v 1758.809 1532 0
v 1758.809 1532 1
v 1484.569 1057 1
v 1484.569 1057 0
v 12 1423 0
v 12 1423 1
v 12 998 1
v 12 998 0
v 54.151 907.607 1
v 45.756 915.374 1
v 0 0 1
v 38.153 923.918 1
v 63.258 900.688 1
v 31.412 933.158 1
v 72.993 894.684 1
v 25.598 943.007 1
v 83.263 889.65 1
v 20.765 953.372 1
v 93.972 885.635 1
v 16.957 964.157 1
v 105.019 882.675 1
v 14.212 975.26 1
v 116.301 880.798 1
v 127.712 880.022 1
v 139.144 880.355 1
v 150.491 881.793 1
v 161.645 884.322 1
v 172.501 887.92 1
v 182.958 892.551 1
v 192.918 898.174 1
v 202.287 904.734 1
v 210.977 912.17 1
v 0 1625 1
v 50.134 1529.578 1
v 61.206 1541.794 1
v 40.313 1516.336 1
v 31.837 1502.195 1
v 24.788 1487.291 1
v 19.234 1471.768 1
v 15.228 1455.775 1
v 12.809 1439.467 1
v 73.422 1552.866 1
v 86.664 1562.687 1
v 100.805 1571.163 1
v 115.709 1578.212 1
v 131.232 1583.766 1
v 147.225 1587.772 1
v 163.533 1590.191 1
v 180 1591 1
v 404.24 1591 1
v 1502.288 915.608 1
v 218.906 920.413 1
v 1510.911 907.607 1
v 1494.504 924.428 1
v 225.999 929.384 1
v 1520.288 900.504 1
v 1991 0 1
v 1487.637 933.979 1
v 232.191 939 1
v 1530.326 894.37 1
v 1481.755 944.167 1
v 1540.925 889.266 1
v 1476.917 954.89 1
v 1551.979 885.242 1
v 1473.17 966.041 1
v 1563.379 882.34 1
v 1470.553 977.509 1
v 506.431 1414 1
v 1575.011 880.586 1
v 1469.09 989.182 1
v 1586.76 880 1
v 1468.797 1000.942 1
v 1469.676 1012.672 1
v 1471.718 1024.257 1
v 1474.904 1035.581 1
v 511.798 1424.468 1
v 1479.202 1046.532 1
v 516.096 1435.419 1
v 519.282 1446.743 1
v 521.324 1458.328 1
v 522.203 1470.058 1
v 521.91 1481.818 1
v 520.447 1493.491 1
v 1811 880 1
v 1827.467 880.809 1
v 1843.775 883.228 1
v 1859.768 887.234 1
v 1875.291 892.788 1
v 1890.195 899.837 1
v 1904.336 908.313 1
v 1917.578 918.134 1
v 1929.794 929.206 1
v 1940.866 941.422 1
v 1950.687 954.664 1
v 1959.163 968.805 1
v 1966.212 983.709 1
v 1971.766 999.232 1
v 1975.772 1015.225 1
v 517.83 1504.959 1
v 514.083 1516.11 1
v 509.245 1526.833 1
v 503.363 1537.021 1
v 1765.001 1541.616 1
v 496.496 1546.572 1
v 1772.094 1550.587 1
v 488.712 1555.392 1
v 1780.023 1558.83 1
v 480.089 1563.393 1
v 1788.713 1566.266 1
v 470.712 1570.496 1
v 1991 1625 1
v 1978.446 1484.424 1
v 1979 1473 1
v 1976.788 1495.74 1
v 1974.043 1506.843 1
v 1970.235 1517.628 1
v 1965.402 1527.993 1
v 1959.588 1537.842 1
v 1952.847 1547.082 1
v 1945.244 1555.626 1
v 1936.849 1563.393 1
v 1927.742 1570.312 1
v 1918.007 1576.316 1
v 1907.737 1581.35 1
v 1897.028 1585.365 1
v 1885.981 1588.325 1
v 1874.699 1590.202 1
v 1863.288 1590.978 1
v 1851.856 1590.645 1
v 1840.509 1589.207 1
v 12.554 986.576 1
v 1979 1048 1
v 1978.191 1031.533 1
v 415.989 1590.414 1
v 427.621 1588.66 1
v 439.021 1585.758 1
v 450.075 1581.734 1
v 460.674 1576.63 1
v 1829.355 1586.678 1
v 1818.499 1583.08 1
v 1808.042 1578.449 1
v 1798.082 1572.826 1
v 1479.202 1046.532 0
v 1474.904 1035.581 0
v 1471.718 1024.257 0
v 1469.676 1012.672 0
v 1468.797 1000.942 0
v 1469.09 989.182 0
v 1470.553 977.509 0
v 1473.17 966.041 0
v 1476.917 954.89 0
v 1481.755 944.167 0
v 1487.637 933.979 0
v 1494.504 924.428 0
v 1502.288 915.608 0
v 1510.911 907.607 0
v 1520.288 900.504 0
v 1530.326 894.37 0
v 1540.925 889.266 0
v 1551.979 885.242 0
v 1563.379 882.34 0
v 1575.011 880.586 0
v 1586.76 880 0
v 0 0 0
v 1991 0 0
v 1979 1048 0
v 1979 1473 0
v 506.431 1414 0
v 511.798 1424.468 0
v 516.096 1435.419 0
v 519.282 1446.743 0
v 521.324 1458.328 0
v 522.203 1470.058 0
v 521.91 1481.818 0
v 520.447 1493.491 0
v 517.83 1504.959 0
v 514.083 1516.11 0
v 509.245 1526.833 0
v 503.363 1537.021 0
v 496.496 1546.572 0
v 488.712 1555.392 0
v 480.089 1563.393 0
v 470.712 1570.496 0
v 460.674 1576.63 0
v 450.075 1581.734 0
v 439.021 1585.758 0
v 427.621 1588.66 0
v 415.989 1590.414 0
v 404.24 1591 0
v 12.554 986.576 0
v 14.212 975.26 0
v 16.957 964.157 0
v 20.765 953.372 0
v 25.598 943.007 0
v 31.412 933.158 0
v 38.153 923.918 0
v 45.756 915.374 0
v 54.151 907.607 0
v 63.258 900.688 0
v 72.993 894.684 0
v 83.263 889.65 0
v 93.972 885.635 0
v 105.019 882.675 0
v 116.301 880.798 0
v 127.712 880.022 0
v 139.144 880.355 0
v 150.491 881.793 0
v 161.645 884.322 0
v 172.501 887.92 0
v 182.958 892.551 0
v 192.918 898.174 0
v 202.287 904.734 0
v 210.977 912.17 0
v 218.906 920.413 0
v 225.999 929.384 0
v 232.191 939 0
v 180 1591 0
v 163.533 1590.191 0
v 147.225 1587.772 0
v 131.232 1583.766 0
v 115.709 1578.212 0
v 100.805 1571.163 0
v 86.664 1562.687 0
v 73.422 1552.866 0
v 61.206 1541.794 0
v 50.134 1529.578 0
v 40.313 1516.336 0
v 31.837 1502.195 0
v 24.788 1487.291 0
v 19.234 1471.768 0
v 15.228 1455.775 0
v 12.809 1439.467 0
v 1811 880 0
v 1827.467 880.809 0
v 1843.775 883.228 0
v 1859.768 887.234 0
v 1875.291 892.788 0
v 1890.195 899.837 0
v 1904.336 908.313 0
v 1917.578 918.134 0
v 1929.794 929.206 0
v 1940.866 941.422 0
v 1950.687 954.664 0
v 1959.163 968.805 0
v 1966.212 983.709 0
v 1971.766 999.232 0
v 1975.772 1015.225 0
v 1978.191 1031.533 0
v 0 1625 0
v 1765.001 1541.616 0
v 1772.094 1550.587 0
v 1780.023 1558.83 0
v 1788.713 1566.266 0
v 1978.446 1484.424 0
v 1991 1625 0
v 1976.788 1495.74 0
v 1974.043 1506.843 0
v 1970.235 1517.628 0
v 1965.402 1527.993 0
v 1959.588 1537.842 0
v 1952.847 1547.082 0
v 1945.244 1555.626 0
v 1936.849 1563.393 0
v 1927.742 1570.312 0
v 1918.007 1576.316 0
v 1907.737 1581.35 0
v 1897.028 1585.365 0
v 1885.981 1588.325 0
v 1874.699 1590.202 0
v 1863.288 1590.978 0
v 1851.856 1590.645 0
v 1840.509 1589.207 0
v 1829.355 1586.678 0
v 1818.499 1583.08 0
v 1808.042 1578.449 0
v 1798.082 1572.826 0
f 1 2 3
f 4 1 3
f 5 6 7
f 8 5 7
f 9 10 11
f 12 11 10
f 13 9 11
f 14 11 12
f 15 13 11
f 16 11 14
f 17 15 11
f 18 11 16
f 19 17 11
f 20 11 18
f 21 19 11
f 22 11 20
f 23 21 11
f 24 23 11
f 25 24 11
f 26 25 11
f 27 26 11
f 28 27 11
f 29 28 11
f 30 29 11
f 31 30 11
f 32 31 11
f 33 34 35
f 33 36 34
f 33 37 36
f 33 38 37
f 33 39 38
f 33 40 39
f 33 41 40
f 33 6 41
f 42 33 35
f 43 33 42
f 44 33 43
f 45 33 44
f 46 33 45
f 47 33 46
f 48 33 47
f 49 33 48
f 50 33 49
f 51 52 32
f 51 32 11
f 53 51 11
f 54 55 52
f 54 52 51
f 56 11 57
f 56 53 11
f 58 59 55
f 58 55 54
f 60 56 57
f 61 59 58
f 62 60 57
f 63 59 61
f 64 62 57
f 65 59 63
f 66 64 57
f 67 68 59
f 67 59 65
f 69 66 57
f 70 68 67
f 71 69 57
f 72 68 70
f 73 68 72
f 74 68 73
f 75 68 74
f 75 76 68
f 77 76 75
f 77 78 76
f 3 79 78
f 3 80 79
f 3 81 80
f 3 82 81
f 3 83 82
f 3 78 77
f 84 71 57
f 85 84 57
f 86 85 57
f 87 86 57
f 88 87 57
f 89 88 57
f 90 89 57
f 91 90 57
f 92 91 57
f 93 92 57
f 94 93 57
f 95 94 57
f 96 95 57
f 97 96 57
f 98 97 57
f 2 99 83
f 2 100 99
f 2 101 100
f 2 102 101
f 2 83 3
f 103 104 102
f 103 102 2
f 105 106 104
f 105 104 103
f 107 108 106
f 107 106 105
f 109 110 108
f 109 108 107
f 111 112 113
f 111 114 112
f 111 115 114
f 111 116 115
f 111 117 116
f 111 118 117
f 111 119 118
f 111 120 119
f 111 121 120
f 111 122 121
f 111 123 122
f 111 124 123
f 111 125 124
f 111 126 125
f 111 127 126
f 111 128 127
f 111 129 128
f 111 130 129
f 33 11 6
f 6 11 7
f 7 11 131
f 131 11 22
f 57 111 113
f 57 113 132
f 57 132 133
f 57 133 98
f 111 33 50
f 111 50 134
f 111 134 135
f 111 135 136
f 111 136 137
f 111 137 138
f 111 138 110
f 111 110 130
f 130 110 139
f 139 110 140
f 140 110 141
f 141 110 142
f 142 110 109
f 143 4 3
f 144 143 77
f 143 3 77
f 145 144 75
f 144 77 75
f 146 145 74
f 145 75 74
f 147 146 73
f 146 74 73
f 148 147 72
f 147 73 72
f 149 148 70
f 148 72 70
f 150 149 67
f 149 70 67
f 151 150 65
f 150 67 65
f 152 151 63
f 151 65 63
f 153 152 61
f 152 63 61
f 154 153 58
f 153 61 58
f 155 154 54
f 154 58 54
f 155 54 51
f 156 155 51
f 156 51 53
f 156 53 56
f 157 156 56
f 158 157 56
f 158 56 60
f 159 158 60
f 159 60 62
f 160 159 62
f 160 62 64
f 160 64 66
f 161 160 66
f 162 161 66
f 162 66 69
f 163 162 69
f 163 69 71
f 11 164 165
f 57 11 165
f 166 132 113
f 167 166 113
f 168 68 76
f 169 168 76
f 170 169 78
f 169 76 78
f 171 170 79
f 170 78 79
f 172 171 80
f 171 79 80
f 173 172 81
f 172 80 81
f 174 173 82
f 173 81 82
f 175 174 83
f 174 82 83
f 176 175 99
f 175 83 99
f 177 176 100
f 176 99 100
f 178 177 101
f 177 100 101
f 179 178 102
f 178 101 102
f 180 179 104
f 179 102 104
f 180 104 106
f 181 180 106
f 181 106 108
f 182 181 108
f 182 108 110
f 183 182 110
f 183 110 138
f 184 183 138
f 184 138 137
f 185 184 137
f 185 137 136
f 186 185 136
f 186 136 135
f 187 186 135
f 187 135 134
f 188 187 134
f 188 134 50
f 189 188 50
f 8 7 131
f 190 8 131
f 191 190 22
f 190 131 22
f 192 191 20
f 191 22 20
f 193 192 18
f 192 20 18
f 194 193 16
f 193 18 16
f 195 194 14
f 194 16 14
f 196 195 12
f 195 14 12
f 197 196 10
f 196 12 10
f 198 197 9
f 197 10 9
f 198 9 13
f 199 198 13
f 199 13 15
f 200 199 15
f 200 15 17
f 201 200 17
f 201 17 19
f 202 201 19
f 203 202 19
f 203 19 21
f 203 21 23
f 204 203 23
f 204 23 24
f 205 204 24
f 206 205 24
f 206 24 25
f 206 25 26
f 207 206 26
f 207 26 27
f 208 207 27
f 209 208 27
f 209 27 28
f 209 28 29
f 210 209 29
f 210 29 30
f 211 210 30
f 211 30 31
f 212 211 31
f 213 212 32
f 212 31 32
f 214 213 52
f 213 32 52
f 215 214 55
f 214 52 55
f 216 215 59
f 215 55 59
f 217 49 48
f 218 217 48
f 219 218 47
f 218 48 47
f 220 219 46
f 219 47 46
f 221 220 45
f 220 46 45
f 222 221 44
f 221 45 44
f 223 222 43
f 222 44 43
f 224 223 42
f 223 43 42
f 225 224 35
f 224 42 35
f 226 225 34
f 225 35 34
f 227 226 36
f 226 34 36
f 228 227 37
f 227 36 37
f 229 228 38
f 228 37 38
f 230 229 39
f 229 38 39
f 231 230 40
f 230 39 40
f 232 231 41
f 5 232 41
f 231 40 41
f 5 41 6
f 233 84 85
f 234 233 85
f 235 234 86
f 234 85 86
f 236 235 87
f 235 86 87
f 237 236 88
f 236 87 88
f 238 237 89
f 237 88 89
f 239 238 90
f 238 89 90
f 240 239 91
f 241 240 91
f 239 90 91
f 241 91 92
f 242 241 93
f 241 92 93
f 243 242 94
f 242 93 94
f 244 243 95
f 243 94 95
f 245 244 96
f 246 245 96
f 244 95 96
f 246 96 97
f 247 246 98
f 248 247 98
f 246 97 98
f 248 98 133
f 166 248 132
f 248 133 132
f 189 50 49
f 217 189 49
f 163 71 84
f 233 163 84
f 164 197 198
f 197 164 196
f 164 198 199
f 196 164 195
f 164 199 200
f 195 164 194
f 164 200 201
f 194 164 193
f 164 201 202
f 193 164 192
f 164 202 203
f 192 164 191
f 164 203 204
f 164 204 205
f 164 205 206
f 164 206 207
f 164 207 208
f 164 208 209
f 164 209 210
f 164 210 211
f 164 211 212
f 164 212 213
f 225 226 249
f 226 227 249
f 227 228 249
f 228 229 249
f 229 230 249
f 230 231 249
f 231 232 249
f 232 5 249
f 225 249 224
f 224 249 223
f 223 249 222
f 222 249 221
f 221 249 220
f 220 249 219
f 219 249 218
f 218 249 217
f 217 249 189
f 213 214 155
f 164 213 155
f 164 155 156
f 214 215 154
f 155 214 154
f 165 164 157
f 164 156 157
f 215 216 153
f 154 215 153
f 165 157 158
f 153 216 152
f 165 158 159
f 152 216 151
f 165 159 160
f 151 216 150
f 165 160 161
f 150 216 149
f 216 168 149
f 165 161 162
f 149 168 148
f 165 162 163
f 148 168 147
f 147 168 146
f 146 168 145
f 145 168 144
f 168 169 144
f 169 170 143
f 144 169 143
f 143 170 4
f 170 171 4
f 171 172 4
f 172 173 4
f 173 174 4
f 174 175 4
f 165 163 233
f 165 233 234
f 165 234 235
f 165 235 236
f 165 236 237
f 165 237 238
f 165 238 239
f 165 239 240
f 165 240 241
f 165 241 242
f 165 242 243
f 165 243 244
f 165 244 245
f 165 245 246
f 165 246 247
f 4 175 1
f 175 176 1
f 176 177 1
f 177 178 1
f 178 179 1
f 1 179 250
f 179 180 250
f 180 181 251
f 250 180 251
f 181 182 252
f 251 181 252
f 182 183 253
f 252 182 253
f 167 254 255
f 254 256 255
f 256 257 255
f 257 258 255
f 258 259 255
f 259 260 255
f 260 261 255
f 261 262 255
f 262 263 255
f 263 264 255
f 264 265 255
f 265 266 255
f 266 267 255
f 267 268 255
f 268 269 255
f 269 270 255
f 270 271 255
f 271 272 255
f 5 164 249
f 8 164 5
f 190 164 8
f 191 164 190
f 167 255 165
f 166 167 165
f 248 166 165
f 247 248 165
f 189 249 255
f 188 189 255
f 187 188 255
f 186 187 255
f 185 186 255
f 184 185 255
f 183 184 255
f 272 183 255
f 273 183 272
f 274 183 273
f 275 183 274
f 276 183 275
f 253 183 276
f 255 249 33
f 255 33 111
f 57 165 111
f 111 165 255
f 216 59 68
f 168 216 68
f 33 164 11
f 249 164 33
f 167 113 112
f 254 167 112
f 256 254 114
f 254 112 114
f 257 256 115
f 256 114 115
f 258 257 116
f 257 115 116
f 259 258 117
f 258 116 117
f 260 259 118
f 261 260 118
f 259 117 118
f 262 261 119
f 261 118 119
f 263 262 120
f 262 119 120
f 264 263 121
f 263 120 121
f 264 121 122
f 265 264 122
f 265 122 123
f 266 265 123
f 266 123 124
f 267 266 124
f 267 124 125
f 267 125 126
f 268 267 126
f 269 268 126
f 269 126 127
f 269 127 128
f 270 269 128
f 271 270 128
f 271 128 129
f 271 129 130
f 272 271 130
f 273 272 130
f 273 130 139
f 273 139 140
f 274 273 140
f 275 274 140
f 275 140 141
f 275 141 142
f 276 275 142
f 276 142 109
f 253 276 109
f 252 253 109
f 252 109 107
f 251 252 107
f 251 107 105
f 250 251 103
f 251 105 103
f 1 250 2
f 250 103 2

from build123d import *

# Parameters (mm, degrees)
SKETCH1_W           = 1991
SKETCH1_H           = 1625
BOSS_EXTRUDE1_DEPTH = 1
CUT_EXTRUDE1_DEPTH  = 2789.8673629


with BuildPart() as part:
    # Sketch1 → Boss-Extrude1 (new body)
    with BuildSketch(Plane.XY):
        with Locations((995.5, 812.5)):
            Rectangle(SKETCH1_W, SKETCH1_H)
    extrude(amount=BOSS_EXTRUDE1_DEPTH)

    # Sketch2 → Cut-Extrude1 (cut, through all)
    with BuildSketch(Plane(origin=(259.963517843, -561.616762327, 1), x_dir=(1, 0, 0), z_dir=(0, 0, 1))):
        with BuildLine():
            Line((1498.845356152, 2093.616540003), (1224.605356152, 1618.616540003))
            ThreePointArc((1224.605356152, 1618.616540003), (1224.605548691, 1500.616651165), (1326.796482157, 1441.616762327))
            Line((1326.796482157, 1441.616762327), (1551.036482157, 1441.616762327))
            ThreePointArc((1551.036482157, 1441.616762327), (1669.830421397, 1490.822823088), (1719.036482157, 1609.616762327))
            Line((1719.036482157, 1609.616762327), (1719.036482157, 2034.616762327))
            ThreePointArc((1719.036482157, 2034.616762327), (1631.577005494, 2148.596043051), (1498.845356152, 2093.616540003))
        make_face()
        with BuildLine():
            Line((-247.963517843, 1984.616762327), (-247.963517843, 1559.616762327))
            ThreePointArc((-247.963517843, 1559.616762327), (-160.504041179, 1445.637481603), (-27.772391837, 1500.616984652))
            Line((-27.772391837, 1500.616984652), (246.467608163, 1975.616984652))
            ThreePointArc((246.467608163, 1975.616984652), (246.467415624, 2093.61687349), (144.276482157, 2152.616762327))
            Line((144.276482157, 2152.616762327), (-79.963517843, 2152.616762327))
            ThreePointArc((-79.963517843, 2152.616762327), (-198.757457082, 2103.410701567), (-247.963517843, 1984.616762327))
        make_face()
    extrude(amount=-CUT_EXTRUDE1_DEPTH, mode=Mode.SUBTRACT)


solid = part.part
